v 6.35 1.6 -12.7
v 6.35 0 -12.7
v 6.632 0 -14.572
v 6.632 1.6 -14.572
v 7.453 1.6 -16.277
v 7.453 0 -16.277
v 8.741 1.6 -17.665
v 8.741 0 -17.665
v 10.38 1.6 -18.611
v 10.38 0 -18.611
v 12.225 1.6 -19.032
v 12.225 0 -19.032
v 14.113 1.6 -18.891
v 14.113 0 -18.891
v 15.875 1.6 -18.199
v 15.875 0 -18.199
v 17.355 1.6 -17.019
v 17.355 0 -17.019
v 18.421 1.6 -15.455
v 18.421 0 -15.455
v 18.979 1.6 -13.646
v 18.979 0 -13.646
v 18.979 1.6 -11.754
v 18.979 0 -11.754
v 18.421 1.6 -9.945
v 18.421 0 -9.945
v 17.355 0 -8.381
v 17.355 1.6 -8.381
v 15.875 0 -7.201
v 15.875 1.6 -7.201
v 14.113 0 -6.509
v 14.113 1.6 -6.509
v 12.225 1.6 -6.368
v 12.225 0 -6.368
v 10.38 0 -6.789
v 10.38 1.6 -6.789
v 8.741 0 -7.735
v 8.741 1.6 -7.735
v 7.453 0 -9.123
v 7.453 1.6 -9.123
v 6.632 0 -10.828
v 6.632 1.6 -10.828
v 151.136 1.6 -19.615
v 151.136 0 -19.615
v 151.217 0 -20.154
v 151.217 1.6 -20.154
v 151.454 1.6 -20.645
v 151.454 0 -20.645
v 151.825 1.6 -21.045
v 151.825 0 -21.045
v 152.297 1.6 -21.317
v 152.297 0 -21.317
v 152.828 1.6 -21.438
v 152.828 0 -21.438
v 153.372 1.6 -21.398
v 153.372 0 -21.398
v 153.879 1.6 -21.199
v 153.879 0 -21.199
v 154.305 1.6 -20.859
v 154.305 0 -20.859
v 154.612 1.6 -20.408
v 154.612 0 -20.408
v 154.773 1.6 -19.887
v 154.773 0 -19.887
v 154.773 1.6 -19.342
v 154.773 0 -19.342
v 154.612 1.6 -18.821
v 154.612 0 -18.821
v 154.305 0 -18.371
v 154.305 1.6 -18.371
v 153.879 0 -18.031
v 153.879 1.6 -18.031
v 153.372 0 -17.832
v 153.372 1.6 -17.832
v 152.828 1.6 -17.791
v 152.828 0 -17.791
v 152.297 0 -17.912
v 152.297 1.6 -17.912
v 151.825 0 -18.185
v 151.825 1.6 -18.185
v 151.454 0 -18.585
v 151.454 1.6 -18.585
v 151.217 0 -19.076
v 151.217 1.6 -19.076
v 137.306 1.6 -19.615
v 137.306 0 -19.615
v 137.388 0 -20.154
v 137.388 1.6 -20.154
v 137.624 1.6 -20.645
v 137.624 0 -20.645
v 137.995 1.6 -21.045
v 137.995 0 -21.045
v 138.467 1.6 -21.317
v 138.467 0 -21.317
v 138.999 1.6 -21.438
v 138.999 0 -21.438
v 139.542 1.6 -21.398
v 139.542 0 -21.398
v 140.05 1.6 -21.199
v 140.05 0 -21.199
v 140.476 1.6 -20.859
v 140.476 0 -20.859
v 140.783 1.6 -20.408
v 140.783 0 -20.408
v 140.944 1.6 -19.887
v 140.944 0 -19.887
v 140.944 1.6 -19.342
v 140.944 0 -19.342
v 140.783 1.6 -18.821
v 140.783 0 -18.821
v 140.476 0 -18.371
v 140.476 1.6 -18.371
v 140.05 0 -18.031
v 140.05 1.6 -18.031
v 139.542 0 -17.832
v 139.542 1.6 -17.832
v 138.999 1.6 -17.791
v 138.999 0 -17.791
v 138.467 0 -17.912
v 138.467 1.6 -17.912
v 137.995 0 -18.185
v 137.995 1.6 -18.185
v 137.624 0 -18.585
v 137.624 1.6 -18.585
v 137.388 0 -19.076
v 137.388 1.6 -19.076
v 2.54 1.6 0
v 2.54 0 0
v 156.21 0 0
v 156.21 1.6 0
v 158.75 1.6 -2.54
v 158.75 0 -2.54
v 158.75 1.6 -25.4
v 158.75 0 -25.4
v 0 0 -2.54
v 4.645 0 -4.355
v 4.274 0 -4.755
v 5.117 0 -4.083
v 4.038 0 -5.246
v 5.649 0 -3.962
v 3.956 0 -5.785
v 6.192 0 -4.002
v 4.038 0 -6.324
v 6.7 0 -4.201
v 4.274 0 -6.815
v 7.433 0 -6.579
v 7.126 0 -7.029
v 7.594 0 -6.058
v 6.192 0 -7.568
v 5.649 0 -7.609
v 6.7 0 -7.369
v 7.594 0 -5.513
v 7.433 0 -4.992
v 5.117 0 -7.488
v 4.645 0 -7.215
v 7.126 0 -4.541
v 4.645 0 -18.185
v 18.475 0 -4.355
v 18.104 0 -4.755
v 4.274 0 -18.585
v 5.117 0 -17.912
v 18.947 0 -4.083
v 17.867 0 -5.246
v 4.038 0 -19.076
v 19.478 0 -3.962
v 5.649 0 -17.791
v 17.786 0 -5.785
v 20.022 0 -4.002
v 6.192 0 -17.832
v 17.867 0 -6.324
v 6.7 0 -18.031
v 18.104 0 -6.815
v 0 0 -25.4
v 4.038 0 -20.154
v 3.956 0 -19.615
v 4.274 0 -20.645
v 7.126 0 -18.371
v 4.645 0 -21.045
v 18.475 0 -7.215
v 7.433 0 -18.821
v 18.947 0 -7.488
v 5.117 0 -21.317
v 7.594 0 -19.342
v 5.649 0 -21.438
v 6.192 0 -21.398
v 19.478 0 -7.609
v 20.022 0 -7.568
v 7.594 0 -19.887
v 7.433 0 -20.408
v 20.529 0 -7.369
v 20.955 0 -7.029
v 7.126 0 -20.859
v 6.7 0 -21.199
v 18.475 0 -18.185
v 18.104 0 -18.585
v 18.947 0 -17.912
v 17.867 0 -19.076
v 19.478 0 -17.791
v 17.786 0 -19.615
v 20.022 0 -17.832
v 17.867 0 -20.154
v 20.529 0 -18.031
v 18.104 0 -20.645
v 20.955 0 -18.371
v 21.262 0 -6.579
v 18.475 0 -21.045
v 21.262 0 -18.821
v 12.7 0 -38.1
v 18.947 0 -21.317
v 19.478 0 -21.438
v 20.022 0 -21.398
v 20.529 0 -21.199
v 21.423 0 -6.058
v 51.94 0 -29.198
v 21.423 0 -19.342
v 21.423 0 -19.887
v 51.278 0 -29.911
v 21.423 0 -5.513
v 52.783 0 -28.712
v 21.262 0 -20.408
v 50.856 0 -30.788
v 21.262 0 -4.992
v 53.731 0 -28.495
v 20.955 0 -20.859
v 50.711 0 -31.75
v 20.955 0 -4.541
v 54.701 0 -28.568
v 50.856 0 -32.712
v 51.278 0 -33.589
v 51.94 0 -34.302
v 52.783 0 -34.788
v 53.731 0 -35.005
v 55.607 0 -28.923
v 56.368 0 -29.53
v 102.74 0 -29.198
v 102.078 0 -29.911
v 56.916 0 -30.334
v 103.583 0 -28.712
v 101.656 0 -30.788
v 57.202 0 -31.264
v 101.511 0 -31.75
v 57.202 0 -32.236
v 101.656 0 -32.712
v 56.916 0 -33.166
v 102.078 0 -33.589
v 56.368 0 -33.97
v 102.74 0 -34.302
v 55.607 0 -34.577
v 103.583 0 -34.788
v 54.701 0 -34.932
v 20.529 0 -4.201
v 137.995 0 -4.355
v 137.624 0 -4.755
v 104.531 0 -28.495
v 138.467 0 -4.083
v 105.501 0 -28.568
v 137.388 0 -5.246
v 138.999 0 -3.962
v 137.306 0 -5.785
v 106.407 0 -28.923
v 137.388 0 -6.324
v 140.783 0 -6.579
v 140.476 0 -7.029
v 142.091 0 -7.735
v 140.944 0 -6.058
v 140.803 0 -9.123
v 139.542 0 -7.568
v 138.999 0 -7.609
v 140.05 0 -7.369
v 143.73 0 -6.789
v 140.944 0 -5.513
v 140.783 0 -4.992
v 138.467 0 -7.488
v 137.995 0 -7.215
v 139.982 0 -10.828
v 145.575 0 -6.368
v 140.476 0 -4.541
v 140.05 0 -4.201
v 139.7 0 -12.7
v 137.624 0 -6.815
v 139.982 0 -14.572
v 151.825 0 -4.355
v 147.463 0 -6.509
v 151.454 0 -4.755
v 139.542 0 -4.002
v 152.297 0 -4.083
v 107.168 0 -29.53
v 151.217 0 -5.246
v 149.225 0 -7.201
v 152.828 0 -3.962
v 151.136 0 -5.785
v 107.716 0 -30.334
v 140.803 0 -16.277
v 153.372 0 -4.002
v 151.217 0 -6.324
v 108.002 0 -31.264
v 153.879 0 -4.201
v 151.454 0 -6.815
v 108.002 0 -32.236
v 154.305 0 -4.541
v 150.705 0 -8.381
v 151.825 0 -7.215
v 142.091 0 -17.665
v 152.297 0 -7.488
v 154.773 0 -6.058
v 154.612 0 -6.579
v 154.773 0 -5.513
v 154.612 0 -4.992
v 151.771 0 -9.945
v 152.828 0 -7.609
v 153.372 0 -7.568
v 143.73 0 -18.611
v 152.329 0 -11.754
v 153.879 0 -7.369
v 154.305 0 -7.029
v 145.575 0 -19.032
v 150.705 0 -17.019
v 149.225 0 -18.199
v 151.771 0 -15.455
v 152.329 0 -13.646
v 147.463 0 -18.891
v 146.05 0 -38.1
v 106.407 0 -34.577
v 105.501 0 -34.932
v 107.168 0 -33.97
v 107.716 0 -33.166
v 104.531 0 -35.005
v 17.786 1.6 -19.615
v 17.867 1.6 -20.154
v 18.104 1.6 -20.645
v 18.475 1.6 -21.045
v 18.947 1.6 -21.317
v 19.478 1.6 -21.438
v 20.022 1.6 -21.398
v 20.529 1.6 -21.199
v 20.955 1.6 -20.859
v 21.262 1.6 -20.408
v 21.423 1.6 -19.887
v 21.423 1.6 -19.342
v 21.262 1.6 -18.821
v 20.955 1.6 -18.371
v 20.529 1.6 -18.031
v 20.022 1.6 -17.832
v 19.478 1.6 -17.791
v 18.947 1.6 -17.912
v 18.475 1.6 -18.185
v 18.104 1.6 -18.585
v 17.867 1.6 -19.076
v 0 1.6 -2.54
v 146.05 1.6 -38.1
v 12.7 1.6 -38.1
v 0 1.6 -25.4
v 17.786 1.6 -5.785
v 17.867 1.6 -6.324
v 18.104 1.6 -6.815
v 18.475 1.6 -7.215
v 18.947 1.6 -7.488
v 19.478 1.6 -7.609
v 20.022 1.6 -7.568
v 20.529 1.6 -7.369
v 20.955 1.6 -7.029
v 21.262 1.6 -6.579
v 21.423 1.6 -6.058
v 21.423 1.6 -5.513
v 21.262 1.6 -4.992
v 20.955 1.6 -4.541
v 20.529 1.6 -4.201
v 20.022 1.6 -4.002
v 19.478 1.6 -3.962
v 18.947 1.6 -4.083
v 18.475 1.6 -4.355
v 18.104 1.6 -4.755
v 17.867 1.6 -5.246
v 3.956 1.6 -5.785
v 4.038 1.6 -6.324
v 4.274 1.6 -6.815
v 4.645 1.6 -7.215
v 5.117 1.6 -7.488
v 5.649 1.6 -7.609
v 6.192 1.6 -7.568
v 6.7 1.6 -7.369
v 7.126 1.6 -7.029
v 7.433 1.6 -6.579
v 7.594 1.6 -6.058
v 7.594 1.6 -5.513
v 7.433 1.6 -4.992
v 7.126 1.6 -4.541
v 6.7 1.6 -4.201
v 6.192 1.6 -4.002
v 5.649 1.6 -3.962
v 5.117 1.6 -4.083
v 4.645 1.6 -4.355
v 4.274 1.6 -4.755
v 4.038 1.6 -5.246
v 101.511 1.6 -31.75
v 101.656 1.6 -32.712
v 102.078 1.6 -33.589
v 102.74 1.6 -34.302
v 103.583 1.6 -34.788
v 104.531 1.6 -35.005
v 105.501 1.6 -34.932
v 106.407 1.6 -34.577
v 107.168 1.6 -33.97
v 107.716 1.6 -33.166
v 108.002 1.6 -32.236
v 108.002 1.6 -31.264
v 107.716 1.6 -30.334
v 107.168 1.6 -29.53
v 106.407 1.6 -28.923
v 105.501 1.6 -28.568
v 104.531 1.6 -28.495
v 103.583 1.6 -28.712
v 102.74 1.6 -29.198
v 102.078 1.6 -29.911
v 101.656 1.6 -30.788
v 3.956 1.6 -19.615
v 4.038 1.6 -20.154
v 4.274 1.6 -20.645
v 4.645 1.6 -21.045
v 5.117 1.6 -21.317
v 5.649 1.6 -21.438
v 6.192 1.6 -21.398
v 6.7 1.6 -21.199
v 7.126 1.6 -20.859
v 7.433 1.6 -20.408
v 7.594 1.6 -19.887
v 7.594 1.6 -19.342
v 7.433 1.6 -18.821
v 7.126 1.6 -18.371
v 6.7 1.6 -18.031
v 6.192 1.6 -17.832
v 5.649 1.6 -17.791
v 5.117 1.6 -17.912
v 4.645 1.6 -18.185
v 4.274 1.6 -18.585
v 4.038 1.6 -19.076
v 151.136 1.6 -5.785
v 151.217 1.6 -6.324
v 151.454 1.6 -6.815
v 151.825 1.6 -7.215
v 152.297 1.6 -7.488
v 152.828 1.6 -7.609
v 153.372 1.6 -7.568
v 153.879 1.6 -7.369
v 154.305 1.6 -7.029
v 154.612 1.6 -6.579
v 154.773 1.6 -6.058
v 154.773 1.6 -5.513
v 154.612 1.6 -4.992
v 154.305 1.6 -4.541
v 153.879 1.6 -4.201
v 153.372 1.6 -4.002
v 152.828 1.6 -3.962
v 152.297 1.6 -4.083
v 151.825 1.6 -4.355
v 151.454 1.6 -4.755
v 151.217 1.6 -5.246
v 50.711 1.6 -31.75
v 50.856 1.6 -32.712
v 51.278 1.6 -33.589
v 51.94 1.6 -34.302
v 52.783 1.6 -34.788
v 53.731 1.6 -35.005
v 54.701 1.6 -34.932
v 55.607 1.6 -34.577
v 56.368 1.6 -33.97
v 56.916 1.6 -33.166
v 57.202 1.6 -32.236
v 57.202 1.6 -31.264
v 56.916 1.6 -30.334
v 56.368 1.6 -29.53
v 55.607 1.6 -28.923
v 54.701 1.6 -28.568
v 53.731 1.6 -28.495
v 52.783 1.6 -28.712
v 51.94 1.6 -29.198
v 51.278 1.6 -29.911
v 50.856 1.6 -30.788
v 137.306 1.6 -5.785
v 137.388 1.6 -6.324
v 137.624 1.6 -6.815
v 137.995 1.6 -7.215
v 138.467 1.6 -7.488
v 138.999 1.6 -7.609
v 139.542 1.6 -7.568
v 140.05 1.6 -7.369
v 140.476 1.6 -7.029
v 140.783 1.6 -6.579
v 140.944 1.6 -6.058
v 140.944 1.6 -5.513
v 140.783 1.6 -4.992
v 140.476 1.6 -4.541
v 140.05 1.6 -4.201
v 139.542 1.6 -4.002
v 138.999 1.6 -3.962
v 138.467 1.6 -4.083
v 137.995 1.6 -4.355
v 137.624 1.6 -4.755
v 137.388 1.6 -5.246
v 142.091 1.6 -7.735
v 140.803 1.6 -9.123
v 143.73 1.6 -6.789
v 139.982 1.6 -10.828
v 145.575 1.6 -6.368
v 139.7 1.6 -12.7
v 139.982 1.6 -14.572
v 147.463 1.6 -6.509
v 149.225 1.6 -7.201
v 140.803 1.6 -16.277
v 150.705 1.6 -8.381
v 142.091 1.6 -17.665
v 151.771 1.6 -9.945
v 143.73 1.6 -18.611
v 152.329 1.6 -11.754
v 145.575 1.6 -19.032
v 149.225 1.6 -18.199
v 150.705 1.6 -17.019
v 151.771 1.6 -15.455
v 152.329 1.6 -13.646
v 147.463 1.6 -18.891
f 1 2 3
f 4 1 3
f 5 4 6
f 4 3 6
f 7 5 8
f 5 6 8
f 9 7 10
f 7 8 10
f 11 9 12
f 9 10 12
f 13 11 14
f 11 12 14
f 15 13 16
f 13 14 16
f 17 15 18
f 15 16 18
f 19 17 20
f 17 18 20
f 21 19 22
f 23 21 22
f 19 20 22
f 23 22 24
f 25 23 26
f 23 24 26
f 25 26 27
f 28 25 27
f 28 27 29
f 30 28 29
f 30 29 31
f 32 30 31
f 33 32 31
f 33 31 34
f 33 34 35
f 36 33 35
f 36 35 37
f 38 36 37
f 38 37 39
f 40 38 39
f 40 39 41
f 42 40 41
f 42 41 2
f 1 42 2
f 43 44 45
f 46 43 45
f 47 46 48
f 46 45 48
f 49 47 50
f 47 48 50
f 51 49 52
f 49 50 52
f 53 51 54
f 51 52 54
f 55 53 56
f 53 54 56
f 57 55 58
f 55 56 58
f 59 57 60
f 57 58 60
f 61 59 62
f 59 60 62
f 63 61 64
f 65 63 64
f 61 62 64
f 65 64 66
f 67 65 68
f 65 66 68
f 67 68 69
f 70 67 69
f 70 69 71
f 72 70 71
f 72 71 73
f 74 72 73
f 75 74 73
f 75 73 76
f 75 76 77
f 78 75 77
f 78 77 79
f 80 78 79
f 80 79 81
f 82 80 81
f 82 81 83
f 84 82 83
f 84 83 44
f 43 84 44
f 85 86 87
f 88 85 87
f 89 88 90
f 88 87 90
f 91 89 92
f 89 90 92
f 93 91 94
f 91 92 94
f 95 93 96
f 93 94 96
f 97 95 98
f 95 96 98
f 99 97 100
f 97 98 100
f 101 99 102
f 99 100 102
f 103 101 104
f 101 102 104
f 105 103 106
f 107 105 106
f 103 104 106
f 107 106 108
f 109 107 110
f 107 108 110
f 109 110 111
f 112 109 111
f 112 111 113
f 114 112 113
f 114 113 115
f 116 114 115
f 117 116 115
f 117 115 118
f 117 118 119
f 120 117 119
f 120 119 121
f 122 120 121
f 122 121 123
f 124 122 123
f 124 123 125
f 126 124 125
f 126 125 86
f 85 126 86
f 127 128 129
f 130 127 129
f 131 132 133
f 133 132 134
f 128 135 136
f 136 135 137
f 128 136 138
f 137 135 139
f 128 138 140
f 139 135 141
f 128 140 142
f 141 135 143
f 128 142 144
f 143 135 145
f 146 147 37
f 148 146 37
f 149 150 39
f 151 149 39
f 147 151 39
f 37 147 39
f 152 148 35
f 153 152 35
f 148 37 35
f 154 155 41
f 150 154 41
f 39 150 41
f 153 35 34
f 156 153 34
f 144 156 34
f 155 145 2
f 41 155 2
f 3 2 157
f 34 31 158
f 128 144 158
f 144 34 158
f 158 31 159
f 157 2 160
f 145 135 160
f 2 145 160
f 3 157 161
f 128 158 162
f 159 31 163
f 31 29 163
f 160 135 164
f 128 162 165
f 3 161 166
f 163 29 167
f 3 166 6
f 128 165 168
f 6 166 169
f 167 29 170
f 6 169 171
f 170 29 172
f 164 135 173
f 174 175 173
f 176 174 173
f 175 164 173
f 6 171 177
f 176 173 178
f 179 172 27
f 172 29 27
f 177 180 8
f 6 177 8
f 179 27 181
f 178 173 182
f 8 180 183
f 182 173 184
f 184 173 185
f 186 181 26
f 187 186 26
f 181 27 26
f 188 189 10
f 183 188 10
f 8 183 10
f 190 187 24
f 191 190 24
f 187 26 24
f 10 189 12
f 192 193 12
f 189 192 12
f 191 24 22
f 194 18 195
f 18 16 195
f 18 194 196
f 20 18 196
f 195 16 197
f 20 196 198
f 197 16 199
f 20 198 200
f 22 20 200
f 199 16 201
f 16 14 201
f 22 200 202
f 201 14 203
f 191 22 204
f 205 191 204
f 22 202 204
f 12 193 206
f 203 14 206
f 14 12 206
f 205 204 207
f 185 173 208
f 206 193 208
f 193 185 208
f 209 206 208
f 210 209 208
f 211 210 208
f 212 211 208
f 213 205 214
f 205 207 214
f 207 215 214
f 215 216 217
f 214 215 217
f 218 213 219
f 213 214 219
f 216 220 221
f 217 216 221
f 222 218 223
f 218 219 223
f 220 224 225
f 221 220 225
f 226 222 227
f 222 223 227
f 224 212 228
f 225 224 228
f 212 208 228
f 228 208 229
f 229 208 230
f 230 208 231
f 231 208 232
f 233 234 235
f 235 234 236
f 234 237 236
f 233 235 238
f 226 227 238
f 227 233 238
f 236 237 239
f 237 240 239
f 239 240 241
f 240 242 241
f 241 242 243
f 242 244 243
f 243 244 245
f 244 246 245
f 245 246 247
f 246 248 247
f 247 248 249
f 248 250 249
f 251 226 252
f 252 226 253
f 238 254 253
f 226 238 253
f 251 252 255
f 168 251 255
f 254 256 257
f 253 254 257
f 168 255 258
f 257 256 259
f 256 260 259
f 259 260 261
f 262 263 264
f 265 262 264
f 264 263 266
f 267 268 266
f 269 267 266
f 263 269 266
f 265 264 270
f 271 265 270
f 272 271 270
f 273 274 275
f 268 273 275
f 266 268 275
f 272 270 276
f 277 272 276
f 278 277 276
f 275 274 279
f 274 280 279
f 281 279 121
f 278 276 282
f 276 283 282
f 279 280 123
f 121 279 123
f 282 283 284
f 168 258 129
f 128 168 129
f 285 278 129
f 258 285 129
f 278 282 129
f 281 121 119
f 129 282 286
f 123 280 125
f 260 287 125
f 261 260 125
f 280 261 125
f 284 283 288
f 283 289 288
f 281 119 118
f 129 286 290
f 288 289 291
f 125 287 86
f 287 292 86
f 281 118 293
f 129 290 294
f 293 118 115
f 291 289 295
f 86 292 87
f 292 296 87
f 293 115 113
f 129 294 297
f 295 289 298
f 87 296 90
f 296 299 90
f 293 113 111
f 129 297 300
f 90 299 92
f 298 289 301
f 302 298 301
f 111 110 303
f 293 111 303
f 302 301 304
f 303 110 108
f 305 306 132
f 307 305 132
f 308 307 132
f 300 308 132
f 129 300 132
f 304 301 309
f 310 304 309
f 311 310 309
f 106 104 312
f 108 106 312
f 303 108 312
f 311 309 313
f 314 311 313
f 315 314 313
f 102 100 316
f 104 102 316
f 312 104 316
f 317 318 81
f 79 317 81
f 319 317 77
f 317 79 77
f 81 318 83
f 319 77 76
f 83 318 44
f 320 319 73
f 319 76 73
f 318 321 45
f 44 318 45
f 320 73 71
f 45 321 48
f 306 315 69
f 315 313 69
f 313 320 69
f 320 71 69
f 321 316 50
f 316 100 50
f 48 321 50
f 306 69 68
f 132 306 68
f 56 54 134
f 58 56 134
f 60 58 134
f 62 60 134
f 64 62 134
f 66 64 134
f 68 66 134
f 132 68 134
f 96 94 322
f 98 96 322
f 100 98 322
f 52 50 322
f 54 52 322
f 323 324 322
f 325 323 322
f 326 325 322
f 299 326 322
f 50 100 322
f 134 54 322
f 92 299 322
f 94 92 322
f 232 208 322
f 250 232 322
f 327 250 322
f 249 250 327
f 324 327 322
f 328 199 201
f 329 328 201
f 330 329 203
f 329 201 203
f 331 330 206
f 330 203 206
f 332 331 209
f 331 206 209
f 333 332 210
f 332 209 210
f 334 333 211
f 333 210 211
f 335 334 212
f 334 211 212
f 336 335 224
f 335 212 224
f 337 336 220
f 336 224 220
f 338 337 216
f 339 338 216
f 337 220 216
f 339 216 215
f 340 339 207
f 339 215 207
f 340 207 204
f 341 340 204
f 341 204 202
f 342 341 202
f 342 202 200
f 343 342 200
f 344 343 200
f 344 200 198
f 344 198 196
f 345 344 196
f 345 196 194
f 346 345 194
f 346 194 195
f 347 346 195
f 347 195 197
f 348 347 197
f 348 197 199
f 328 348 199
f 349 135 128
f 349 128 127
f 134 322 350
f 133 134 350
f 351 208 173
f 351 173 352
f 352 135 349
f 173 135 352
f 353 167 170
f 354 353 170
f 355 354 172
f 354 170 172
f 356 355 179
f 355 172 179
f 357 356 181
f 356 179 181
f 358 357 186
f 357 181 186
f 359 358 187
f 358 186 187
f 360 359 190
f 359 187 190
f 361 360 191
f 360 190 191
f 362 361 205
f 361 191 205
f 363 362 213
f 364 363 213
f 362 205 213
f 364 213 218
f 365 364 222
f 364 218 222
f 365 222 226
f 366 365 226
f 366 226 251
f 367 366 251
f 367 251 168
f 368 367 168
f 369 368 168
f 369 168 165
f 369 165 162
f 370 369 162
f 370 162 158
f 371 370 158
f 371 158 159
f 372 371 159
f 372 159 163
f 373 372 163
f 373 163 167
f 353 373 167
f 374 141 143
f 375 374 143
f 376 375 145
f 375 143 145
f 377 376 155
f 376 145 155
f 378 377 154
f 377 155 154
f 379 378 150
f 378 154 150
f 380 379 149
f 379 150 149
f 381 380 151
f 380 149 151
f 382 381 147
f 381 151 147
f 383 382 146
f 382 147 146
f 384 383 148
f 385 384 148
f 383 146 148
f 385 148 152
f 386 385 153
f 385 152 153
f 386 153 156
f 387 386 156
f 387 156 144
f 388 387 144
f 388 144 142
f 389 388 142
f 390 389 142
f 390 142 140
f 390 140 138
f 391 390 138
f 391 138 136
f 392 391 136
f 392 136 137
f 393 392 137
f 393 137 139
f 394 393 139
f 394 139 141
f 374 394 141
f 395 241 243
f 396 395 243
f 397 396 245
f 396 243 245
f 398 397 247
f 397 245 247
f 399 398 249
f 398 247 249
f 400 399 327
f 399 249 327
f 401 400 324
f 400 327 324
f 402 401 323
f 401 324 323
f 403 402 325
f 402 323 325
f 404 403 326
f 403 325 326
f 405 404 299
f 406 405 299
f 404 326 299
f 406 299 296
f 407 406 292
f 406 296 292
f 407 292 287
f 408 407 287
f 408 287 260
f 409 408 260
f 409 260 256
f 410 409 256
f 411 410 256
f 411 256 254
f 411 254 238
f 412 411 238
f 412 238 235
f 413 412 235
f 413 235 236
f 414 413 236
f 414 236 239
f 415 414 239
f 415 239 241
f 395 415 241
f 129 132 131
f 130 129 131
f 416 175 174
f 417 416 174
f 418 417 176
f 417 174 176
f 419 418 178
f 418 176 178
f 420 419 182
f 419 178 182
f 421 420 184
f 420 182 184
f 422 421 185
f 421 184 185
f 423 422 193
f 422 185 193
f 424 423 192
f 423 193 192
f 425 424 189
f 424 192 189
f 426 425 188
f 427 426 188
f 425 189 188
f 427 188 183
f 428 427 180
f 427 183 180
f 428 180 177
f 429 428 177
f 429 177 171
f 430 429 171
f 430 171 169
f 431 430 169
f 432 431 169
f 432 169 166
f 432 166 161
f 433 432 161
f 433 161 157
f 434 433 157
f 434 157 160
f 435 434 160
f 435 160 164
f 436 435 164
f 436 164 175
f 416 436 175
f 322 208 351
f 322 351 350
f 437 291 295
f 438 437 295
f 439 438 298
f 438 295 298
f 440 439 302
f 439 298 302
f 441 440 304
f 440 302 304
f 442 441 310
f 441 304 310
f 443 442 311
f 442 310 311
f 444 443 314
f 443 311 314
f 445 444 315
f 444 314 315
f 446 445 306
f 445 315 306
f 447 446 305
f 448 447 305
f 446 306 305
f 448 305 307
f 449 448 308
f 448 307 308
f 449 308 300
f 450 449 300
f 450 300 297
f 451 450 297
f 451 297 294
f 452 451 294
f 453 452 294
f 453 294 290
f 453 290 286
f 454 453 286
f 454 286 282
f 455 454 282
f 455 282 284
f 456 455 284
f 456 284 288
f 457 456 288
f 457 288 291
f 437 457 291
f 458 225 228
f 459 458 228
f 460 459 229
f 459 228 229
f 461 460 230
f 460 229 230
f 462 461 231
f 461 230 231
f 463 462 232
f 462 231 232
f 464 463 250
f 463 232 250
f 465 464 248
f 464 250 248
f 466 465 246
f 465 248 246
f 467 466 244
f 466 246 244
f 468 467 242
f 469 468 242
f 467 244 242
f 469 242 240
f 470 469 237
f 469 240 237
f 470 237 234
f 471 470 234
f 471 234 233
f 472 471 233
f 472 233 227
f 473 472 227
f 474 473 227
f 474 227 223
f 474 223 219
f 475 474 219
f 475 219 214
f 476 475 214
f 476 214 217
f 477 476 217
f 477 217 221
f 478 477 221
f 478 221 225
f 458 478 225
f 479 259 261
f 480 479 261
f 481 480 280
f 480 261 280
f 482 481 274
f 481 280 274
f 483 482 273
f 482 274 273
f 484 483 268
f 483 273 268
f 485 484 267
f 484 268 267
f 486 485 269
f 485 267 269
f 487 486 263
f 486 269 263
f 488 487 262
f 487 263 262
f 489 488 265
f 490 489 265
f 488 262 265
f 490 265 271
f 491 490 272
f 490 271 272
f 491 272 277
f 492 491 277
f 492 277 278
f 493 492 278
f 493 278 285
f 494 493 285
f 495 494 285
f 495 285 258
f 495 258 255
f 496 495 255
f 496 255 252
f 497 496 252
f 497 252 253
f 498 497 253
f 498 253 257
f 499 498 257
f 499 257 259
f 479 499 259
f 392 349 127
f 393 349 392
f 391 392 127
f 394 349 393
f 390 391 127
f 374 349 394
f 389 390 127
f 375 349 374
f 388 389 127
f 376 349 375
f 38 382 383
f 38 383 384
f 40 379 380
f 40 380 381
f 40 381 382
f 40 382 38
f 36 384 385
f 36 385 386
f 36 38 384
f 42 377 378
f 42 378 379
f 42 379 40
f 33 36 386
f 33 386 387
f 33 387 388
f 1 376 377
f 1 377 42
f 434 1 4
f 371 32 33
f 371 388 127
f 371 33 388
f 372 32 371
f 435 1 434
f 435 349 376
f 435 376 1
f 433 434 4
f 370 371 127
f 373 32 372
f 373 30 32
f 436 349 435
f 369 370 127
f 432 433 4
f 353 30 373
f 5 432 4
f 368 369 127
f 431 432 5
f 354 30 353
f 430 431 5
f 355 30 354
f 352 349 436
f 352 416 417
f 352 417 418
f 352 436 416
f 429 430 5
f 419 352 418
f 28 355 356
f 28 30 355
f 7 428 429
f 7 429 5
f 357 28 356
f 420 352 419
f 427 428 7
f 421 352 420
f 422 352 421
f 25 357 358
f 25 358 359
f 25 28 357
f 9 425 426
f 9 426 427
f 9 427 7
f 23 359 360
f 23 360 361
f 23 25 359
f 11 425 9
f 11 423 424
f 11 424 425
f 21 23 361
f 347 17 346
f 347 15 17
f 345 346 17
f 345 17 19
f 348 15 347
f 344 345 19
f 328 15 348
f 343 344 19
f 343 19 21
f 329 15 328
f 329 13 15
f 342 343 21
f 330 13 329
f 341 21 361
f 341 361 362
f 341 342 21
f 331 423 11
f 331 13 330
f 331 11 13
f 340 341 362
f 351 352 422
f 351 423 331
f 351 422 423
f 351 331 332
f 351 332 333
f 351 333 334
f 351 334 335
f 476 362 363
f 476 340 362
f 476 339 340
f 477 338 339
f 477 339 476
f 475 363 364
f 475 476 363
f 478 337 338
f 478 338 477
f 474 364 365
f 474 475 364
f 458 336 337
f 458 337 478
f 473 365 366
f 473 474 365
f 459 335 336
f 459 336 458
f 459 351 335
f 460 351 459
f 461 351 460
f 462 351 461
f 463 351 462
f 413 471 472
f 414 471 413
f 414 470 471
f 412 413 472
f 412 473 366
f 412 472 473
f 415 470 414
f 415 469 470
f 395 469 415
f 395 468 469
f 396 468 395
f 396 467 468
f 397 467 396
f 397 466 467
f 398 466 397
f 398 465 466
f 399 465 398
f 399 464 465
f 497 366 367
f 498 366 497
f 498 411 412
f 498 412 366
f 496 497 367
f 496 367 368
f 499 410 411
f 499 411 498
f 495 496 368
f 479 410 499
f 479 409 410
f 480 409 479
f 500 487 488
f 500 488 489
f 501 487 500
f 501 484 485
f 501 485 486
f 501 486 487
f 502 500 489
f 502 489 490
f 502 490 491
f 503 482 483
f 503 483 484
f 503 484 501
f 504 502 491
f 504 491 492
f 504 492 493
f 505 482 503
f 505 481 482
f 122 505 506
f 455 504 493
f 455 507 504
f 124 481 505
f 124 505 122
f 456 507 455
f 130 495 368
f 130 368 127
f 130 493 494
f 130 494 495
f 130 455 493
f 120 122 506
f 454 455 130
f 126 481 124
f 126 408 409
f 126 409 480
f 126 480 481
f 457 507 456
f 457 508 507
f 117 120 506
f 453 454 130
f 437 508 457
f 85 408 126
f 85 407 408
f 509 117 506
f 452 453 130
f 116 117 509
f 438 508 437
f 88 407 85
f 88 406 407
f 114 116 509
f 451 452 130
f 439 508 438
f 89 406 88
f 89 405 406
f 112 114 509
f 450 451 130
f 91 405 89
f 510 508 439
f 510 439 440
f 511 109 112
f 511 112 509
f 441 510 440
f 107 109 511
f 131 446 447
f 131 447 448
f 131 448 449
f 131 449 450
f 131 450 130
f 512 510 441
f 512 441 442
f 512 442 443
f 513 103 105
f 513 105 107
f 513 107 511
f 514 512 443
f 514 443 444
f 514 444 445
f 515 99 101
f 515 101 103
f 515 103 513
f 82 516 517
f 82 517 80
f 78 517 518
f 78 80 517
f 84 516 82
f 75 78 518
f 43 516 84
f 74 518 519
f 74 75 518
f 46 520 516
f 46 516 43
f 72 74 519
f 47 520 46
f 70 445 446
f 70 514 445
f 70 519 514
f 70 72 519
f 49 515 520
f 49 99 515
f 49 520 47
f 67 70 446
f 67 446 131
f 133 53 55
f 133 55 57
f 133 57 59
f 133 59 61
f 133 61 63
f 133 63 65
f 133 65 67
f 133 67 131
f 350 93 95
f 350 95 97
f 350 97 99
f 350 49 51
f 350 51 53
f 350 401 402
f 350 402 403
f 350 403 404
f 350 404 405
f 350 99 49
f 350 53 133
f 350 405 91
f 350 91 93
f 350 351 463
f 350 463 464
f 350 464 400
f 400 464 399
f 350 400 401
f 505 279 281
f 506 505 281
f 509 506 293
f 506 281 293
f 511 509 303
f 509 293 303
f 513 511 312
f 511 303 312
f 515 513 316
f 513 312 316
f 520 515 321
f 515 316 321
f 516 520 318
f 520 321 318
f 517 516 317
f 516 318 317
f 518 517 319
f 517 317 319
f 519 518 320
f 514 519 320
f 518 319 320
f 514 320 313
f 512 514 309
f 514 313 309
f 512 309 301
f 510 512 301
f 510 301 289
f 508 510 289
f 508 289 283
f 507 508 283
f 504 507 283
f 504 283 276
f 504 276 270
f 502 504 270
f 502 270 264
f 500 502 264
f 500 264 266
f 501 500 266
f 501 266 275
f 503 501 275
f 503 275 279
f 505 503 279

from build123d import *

# Parameters (mm, degrees)
SKETCH1_W                   = 158.75
SKETCH1_H                   = 38.1
BOSS_EXTRUDE1_DEPTH         = 1.6002
F_27_0_144_DIAMETER_HOLE1_D = 3.6576
F_1_2_0_5_DIAMETER_HOLE1_D  = 12.7
F_0_257_DIAMETER_HOLE1_D    = 6.5278
CHAMFER1_SIZE               = 2.54
CHAMFER2_SIZE               = 12.7


with BuildPart() as part:
    # Sketch1 → Boss-Extrude1 (new body)
    with BuildSketch(Plane(origin=(0, 0, 0), x_dir=(1, 0, 0), z_dir=(0, 1, 0))):
        with Locations((79.375, 19.05)):
            Rectangle(SKETCH1_W, SKETCH1_H)
    extrude(amount=BOSS_EXTRUDE1_DEPTH)

    # #27 (0.144) Diameter Hole1 (through all)
    with Locations(Plane(origin=(0, 1.6002, 0), x_dir=(1, 0, 0), z_dir=(0, 1, 0))):
        with Locations((5.785202787, 19.614797213), (19.614797213, 5.785202787), (5.785202787, 5.785202787), (19.614797213, 19.614797213), (152.964797213, 5.785202787), (139.135202787, 5.785202787), (139.135202787, 19.614797213), (152.964797213, 19.614797213)):
            Hole(F_27_0_144_DIAMETER_HOLE1_D / 2)

    # 1/2 (0.5) Diameter Hole1 (through all)
    with Locations(Plane(origin=(0, 1.6002, 0), x_dir=(1, 0, 0), z_dir=(0, 1, 0))):
        with Locations((12.7, 12.7), (146.05, 12.7)):
            Hole(F_1_2_0_5_DIAMETER_HOLE1_D / 2)

    # F (0.257) Diameter Hole1 (through all)
    with Locations(Plane(origin=(0, 1.6002, 0), x_dir=(1, 0, 0), z_dir=(0, 1, 0))):
        with Locations((53.975, 31.75), (104.775, 31.75)):
            Hole(F_0_257_DIAMETER_HOLE1_D / 2)

    # Chamfer1
    chamfer1_edges = [part.edges().sort_by_distance(p)[0] for p in [
        (158.75, 0.8001, 0),
        (0, 0.8001, 0),
    ]]
    chamfer(chamfer1_edges, length=CHAMFER1_SIZE)

    # Chamfer2
    chamfer2_edges = [part.edges().sort_by_distance(p)[0] for p in [
        (0, 0.8001, -38.1),
        (158.75, 0.8001, -38.1),
    ]]
    chamfer(chamfer2_edges, length=CHAMFER2_SIZE)


solid = part.part
